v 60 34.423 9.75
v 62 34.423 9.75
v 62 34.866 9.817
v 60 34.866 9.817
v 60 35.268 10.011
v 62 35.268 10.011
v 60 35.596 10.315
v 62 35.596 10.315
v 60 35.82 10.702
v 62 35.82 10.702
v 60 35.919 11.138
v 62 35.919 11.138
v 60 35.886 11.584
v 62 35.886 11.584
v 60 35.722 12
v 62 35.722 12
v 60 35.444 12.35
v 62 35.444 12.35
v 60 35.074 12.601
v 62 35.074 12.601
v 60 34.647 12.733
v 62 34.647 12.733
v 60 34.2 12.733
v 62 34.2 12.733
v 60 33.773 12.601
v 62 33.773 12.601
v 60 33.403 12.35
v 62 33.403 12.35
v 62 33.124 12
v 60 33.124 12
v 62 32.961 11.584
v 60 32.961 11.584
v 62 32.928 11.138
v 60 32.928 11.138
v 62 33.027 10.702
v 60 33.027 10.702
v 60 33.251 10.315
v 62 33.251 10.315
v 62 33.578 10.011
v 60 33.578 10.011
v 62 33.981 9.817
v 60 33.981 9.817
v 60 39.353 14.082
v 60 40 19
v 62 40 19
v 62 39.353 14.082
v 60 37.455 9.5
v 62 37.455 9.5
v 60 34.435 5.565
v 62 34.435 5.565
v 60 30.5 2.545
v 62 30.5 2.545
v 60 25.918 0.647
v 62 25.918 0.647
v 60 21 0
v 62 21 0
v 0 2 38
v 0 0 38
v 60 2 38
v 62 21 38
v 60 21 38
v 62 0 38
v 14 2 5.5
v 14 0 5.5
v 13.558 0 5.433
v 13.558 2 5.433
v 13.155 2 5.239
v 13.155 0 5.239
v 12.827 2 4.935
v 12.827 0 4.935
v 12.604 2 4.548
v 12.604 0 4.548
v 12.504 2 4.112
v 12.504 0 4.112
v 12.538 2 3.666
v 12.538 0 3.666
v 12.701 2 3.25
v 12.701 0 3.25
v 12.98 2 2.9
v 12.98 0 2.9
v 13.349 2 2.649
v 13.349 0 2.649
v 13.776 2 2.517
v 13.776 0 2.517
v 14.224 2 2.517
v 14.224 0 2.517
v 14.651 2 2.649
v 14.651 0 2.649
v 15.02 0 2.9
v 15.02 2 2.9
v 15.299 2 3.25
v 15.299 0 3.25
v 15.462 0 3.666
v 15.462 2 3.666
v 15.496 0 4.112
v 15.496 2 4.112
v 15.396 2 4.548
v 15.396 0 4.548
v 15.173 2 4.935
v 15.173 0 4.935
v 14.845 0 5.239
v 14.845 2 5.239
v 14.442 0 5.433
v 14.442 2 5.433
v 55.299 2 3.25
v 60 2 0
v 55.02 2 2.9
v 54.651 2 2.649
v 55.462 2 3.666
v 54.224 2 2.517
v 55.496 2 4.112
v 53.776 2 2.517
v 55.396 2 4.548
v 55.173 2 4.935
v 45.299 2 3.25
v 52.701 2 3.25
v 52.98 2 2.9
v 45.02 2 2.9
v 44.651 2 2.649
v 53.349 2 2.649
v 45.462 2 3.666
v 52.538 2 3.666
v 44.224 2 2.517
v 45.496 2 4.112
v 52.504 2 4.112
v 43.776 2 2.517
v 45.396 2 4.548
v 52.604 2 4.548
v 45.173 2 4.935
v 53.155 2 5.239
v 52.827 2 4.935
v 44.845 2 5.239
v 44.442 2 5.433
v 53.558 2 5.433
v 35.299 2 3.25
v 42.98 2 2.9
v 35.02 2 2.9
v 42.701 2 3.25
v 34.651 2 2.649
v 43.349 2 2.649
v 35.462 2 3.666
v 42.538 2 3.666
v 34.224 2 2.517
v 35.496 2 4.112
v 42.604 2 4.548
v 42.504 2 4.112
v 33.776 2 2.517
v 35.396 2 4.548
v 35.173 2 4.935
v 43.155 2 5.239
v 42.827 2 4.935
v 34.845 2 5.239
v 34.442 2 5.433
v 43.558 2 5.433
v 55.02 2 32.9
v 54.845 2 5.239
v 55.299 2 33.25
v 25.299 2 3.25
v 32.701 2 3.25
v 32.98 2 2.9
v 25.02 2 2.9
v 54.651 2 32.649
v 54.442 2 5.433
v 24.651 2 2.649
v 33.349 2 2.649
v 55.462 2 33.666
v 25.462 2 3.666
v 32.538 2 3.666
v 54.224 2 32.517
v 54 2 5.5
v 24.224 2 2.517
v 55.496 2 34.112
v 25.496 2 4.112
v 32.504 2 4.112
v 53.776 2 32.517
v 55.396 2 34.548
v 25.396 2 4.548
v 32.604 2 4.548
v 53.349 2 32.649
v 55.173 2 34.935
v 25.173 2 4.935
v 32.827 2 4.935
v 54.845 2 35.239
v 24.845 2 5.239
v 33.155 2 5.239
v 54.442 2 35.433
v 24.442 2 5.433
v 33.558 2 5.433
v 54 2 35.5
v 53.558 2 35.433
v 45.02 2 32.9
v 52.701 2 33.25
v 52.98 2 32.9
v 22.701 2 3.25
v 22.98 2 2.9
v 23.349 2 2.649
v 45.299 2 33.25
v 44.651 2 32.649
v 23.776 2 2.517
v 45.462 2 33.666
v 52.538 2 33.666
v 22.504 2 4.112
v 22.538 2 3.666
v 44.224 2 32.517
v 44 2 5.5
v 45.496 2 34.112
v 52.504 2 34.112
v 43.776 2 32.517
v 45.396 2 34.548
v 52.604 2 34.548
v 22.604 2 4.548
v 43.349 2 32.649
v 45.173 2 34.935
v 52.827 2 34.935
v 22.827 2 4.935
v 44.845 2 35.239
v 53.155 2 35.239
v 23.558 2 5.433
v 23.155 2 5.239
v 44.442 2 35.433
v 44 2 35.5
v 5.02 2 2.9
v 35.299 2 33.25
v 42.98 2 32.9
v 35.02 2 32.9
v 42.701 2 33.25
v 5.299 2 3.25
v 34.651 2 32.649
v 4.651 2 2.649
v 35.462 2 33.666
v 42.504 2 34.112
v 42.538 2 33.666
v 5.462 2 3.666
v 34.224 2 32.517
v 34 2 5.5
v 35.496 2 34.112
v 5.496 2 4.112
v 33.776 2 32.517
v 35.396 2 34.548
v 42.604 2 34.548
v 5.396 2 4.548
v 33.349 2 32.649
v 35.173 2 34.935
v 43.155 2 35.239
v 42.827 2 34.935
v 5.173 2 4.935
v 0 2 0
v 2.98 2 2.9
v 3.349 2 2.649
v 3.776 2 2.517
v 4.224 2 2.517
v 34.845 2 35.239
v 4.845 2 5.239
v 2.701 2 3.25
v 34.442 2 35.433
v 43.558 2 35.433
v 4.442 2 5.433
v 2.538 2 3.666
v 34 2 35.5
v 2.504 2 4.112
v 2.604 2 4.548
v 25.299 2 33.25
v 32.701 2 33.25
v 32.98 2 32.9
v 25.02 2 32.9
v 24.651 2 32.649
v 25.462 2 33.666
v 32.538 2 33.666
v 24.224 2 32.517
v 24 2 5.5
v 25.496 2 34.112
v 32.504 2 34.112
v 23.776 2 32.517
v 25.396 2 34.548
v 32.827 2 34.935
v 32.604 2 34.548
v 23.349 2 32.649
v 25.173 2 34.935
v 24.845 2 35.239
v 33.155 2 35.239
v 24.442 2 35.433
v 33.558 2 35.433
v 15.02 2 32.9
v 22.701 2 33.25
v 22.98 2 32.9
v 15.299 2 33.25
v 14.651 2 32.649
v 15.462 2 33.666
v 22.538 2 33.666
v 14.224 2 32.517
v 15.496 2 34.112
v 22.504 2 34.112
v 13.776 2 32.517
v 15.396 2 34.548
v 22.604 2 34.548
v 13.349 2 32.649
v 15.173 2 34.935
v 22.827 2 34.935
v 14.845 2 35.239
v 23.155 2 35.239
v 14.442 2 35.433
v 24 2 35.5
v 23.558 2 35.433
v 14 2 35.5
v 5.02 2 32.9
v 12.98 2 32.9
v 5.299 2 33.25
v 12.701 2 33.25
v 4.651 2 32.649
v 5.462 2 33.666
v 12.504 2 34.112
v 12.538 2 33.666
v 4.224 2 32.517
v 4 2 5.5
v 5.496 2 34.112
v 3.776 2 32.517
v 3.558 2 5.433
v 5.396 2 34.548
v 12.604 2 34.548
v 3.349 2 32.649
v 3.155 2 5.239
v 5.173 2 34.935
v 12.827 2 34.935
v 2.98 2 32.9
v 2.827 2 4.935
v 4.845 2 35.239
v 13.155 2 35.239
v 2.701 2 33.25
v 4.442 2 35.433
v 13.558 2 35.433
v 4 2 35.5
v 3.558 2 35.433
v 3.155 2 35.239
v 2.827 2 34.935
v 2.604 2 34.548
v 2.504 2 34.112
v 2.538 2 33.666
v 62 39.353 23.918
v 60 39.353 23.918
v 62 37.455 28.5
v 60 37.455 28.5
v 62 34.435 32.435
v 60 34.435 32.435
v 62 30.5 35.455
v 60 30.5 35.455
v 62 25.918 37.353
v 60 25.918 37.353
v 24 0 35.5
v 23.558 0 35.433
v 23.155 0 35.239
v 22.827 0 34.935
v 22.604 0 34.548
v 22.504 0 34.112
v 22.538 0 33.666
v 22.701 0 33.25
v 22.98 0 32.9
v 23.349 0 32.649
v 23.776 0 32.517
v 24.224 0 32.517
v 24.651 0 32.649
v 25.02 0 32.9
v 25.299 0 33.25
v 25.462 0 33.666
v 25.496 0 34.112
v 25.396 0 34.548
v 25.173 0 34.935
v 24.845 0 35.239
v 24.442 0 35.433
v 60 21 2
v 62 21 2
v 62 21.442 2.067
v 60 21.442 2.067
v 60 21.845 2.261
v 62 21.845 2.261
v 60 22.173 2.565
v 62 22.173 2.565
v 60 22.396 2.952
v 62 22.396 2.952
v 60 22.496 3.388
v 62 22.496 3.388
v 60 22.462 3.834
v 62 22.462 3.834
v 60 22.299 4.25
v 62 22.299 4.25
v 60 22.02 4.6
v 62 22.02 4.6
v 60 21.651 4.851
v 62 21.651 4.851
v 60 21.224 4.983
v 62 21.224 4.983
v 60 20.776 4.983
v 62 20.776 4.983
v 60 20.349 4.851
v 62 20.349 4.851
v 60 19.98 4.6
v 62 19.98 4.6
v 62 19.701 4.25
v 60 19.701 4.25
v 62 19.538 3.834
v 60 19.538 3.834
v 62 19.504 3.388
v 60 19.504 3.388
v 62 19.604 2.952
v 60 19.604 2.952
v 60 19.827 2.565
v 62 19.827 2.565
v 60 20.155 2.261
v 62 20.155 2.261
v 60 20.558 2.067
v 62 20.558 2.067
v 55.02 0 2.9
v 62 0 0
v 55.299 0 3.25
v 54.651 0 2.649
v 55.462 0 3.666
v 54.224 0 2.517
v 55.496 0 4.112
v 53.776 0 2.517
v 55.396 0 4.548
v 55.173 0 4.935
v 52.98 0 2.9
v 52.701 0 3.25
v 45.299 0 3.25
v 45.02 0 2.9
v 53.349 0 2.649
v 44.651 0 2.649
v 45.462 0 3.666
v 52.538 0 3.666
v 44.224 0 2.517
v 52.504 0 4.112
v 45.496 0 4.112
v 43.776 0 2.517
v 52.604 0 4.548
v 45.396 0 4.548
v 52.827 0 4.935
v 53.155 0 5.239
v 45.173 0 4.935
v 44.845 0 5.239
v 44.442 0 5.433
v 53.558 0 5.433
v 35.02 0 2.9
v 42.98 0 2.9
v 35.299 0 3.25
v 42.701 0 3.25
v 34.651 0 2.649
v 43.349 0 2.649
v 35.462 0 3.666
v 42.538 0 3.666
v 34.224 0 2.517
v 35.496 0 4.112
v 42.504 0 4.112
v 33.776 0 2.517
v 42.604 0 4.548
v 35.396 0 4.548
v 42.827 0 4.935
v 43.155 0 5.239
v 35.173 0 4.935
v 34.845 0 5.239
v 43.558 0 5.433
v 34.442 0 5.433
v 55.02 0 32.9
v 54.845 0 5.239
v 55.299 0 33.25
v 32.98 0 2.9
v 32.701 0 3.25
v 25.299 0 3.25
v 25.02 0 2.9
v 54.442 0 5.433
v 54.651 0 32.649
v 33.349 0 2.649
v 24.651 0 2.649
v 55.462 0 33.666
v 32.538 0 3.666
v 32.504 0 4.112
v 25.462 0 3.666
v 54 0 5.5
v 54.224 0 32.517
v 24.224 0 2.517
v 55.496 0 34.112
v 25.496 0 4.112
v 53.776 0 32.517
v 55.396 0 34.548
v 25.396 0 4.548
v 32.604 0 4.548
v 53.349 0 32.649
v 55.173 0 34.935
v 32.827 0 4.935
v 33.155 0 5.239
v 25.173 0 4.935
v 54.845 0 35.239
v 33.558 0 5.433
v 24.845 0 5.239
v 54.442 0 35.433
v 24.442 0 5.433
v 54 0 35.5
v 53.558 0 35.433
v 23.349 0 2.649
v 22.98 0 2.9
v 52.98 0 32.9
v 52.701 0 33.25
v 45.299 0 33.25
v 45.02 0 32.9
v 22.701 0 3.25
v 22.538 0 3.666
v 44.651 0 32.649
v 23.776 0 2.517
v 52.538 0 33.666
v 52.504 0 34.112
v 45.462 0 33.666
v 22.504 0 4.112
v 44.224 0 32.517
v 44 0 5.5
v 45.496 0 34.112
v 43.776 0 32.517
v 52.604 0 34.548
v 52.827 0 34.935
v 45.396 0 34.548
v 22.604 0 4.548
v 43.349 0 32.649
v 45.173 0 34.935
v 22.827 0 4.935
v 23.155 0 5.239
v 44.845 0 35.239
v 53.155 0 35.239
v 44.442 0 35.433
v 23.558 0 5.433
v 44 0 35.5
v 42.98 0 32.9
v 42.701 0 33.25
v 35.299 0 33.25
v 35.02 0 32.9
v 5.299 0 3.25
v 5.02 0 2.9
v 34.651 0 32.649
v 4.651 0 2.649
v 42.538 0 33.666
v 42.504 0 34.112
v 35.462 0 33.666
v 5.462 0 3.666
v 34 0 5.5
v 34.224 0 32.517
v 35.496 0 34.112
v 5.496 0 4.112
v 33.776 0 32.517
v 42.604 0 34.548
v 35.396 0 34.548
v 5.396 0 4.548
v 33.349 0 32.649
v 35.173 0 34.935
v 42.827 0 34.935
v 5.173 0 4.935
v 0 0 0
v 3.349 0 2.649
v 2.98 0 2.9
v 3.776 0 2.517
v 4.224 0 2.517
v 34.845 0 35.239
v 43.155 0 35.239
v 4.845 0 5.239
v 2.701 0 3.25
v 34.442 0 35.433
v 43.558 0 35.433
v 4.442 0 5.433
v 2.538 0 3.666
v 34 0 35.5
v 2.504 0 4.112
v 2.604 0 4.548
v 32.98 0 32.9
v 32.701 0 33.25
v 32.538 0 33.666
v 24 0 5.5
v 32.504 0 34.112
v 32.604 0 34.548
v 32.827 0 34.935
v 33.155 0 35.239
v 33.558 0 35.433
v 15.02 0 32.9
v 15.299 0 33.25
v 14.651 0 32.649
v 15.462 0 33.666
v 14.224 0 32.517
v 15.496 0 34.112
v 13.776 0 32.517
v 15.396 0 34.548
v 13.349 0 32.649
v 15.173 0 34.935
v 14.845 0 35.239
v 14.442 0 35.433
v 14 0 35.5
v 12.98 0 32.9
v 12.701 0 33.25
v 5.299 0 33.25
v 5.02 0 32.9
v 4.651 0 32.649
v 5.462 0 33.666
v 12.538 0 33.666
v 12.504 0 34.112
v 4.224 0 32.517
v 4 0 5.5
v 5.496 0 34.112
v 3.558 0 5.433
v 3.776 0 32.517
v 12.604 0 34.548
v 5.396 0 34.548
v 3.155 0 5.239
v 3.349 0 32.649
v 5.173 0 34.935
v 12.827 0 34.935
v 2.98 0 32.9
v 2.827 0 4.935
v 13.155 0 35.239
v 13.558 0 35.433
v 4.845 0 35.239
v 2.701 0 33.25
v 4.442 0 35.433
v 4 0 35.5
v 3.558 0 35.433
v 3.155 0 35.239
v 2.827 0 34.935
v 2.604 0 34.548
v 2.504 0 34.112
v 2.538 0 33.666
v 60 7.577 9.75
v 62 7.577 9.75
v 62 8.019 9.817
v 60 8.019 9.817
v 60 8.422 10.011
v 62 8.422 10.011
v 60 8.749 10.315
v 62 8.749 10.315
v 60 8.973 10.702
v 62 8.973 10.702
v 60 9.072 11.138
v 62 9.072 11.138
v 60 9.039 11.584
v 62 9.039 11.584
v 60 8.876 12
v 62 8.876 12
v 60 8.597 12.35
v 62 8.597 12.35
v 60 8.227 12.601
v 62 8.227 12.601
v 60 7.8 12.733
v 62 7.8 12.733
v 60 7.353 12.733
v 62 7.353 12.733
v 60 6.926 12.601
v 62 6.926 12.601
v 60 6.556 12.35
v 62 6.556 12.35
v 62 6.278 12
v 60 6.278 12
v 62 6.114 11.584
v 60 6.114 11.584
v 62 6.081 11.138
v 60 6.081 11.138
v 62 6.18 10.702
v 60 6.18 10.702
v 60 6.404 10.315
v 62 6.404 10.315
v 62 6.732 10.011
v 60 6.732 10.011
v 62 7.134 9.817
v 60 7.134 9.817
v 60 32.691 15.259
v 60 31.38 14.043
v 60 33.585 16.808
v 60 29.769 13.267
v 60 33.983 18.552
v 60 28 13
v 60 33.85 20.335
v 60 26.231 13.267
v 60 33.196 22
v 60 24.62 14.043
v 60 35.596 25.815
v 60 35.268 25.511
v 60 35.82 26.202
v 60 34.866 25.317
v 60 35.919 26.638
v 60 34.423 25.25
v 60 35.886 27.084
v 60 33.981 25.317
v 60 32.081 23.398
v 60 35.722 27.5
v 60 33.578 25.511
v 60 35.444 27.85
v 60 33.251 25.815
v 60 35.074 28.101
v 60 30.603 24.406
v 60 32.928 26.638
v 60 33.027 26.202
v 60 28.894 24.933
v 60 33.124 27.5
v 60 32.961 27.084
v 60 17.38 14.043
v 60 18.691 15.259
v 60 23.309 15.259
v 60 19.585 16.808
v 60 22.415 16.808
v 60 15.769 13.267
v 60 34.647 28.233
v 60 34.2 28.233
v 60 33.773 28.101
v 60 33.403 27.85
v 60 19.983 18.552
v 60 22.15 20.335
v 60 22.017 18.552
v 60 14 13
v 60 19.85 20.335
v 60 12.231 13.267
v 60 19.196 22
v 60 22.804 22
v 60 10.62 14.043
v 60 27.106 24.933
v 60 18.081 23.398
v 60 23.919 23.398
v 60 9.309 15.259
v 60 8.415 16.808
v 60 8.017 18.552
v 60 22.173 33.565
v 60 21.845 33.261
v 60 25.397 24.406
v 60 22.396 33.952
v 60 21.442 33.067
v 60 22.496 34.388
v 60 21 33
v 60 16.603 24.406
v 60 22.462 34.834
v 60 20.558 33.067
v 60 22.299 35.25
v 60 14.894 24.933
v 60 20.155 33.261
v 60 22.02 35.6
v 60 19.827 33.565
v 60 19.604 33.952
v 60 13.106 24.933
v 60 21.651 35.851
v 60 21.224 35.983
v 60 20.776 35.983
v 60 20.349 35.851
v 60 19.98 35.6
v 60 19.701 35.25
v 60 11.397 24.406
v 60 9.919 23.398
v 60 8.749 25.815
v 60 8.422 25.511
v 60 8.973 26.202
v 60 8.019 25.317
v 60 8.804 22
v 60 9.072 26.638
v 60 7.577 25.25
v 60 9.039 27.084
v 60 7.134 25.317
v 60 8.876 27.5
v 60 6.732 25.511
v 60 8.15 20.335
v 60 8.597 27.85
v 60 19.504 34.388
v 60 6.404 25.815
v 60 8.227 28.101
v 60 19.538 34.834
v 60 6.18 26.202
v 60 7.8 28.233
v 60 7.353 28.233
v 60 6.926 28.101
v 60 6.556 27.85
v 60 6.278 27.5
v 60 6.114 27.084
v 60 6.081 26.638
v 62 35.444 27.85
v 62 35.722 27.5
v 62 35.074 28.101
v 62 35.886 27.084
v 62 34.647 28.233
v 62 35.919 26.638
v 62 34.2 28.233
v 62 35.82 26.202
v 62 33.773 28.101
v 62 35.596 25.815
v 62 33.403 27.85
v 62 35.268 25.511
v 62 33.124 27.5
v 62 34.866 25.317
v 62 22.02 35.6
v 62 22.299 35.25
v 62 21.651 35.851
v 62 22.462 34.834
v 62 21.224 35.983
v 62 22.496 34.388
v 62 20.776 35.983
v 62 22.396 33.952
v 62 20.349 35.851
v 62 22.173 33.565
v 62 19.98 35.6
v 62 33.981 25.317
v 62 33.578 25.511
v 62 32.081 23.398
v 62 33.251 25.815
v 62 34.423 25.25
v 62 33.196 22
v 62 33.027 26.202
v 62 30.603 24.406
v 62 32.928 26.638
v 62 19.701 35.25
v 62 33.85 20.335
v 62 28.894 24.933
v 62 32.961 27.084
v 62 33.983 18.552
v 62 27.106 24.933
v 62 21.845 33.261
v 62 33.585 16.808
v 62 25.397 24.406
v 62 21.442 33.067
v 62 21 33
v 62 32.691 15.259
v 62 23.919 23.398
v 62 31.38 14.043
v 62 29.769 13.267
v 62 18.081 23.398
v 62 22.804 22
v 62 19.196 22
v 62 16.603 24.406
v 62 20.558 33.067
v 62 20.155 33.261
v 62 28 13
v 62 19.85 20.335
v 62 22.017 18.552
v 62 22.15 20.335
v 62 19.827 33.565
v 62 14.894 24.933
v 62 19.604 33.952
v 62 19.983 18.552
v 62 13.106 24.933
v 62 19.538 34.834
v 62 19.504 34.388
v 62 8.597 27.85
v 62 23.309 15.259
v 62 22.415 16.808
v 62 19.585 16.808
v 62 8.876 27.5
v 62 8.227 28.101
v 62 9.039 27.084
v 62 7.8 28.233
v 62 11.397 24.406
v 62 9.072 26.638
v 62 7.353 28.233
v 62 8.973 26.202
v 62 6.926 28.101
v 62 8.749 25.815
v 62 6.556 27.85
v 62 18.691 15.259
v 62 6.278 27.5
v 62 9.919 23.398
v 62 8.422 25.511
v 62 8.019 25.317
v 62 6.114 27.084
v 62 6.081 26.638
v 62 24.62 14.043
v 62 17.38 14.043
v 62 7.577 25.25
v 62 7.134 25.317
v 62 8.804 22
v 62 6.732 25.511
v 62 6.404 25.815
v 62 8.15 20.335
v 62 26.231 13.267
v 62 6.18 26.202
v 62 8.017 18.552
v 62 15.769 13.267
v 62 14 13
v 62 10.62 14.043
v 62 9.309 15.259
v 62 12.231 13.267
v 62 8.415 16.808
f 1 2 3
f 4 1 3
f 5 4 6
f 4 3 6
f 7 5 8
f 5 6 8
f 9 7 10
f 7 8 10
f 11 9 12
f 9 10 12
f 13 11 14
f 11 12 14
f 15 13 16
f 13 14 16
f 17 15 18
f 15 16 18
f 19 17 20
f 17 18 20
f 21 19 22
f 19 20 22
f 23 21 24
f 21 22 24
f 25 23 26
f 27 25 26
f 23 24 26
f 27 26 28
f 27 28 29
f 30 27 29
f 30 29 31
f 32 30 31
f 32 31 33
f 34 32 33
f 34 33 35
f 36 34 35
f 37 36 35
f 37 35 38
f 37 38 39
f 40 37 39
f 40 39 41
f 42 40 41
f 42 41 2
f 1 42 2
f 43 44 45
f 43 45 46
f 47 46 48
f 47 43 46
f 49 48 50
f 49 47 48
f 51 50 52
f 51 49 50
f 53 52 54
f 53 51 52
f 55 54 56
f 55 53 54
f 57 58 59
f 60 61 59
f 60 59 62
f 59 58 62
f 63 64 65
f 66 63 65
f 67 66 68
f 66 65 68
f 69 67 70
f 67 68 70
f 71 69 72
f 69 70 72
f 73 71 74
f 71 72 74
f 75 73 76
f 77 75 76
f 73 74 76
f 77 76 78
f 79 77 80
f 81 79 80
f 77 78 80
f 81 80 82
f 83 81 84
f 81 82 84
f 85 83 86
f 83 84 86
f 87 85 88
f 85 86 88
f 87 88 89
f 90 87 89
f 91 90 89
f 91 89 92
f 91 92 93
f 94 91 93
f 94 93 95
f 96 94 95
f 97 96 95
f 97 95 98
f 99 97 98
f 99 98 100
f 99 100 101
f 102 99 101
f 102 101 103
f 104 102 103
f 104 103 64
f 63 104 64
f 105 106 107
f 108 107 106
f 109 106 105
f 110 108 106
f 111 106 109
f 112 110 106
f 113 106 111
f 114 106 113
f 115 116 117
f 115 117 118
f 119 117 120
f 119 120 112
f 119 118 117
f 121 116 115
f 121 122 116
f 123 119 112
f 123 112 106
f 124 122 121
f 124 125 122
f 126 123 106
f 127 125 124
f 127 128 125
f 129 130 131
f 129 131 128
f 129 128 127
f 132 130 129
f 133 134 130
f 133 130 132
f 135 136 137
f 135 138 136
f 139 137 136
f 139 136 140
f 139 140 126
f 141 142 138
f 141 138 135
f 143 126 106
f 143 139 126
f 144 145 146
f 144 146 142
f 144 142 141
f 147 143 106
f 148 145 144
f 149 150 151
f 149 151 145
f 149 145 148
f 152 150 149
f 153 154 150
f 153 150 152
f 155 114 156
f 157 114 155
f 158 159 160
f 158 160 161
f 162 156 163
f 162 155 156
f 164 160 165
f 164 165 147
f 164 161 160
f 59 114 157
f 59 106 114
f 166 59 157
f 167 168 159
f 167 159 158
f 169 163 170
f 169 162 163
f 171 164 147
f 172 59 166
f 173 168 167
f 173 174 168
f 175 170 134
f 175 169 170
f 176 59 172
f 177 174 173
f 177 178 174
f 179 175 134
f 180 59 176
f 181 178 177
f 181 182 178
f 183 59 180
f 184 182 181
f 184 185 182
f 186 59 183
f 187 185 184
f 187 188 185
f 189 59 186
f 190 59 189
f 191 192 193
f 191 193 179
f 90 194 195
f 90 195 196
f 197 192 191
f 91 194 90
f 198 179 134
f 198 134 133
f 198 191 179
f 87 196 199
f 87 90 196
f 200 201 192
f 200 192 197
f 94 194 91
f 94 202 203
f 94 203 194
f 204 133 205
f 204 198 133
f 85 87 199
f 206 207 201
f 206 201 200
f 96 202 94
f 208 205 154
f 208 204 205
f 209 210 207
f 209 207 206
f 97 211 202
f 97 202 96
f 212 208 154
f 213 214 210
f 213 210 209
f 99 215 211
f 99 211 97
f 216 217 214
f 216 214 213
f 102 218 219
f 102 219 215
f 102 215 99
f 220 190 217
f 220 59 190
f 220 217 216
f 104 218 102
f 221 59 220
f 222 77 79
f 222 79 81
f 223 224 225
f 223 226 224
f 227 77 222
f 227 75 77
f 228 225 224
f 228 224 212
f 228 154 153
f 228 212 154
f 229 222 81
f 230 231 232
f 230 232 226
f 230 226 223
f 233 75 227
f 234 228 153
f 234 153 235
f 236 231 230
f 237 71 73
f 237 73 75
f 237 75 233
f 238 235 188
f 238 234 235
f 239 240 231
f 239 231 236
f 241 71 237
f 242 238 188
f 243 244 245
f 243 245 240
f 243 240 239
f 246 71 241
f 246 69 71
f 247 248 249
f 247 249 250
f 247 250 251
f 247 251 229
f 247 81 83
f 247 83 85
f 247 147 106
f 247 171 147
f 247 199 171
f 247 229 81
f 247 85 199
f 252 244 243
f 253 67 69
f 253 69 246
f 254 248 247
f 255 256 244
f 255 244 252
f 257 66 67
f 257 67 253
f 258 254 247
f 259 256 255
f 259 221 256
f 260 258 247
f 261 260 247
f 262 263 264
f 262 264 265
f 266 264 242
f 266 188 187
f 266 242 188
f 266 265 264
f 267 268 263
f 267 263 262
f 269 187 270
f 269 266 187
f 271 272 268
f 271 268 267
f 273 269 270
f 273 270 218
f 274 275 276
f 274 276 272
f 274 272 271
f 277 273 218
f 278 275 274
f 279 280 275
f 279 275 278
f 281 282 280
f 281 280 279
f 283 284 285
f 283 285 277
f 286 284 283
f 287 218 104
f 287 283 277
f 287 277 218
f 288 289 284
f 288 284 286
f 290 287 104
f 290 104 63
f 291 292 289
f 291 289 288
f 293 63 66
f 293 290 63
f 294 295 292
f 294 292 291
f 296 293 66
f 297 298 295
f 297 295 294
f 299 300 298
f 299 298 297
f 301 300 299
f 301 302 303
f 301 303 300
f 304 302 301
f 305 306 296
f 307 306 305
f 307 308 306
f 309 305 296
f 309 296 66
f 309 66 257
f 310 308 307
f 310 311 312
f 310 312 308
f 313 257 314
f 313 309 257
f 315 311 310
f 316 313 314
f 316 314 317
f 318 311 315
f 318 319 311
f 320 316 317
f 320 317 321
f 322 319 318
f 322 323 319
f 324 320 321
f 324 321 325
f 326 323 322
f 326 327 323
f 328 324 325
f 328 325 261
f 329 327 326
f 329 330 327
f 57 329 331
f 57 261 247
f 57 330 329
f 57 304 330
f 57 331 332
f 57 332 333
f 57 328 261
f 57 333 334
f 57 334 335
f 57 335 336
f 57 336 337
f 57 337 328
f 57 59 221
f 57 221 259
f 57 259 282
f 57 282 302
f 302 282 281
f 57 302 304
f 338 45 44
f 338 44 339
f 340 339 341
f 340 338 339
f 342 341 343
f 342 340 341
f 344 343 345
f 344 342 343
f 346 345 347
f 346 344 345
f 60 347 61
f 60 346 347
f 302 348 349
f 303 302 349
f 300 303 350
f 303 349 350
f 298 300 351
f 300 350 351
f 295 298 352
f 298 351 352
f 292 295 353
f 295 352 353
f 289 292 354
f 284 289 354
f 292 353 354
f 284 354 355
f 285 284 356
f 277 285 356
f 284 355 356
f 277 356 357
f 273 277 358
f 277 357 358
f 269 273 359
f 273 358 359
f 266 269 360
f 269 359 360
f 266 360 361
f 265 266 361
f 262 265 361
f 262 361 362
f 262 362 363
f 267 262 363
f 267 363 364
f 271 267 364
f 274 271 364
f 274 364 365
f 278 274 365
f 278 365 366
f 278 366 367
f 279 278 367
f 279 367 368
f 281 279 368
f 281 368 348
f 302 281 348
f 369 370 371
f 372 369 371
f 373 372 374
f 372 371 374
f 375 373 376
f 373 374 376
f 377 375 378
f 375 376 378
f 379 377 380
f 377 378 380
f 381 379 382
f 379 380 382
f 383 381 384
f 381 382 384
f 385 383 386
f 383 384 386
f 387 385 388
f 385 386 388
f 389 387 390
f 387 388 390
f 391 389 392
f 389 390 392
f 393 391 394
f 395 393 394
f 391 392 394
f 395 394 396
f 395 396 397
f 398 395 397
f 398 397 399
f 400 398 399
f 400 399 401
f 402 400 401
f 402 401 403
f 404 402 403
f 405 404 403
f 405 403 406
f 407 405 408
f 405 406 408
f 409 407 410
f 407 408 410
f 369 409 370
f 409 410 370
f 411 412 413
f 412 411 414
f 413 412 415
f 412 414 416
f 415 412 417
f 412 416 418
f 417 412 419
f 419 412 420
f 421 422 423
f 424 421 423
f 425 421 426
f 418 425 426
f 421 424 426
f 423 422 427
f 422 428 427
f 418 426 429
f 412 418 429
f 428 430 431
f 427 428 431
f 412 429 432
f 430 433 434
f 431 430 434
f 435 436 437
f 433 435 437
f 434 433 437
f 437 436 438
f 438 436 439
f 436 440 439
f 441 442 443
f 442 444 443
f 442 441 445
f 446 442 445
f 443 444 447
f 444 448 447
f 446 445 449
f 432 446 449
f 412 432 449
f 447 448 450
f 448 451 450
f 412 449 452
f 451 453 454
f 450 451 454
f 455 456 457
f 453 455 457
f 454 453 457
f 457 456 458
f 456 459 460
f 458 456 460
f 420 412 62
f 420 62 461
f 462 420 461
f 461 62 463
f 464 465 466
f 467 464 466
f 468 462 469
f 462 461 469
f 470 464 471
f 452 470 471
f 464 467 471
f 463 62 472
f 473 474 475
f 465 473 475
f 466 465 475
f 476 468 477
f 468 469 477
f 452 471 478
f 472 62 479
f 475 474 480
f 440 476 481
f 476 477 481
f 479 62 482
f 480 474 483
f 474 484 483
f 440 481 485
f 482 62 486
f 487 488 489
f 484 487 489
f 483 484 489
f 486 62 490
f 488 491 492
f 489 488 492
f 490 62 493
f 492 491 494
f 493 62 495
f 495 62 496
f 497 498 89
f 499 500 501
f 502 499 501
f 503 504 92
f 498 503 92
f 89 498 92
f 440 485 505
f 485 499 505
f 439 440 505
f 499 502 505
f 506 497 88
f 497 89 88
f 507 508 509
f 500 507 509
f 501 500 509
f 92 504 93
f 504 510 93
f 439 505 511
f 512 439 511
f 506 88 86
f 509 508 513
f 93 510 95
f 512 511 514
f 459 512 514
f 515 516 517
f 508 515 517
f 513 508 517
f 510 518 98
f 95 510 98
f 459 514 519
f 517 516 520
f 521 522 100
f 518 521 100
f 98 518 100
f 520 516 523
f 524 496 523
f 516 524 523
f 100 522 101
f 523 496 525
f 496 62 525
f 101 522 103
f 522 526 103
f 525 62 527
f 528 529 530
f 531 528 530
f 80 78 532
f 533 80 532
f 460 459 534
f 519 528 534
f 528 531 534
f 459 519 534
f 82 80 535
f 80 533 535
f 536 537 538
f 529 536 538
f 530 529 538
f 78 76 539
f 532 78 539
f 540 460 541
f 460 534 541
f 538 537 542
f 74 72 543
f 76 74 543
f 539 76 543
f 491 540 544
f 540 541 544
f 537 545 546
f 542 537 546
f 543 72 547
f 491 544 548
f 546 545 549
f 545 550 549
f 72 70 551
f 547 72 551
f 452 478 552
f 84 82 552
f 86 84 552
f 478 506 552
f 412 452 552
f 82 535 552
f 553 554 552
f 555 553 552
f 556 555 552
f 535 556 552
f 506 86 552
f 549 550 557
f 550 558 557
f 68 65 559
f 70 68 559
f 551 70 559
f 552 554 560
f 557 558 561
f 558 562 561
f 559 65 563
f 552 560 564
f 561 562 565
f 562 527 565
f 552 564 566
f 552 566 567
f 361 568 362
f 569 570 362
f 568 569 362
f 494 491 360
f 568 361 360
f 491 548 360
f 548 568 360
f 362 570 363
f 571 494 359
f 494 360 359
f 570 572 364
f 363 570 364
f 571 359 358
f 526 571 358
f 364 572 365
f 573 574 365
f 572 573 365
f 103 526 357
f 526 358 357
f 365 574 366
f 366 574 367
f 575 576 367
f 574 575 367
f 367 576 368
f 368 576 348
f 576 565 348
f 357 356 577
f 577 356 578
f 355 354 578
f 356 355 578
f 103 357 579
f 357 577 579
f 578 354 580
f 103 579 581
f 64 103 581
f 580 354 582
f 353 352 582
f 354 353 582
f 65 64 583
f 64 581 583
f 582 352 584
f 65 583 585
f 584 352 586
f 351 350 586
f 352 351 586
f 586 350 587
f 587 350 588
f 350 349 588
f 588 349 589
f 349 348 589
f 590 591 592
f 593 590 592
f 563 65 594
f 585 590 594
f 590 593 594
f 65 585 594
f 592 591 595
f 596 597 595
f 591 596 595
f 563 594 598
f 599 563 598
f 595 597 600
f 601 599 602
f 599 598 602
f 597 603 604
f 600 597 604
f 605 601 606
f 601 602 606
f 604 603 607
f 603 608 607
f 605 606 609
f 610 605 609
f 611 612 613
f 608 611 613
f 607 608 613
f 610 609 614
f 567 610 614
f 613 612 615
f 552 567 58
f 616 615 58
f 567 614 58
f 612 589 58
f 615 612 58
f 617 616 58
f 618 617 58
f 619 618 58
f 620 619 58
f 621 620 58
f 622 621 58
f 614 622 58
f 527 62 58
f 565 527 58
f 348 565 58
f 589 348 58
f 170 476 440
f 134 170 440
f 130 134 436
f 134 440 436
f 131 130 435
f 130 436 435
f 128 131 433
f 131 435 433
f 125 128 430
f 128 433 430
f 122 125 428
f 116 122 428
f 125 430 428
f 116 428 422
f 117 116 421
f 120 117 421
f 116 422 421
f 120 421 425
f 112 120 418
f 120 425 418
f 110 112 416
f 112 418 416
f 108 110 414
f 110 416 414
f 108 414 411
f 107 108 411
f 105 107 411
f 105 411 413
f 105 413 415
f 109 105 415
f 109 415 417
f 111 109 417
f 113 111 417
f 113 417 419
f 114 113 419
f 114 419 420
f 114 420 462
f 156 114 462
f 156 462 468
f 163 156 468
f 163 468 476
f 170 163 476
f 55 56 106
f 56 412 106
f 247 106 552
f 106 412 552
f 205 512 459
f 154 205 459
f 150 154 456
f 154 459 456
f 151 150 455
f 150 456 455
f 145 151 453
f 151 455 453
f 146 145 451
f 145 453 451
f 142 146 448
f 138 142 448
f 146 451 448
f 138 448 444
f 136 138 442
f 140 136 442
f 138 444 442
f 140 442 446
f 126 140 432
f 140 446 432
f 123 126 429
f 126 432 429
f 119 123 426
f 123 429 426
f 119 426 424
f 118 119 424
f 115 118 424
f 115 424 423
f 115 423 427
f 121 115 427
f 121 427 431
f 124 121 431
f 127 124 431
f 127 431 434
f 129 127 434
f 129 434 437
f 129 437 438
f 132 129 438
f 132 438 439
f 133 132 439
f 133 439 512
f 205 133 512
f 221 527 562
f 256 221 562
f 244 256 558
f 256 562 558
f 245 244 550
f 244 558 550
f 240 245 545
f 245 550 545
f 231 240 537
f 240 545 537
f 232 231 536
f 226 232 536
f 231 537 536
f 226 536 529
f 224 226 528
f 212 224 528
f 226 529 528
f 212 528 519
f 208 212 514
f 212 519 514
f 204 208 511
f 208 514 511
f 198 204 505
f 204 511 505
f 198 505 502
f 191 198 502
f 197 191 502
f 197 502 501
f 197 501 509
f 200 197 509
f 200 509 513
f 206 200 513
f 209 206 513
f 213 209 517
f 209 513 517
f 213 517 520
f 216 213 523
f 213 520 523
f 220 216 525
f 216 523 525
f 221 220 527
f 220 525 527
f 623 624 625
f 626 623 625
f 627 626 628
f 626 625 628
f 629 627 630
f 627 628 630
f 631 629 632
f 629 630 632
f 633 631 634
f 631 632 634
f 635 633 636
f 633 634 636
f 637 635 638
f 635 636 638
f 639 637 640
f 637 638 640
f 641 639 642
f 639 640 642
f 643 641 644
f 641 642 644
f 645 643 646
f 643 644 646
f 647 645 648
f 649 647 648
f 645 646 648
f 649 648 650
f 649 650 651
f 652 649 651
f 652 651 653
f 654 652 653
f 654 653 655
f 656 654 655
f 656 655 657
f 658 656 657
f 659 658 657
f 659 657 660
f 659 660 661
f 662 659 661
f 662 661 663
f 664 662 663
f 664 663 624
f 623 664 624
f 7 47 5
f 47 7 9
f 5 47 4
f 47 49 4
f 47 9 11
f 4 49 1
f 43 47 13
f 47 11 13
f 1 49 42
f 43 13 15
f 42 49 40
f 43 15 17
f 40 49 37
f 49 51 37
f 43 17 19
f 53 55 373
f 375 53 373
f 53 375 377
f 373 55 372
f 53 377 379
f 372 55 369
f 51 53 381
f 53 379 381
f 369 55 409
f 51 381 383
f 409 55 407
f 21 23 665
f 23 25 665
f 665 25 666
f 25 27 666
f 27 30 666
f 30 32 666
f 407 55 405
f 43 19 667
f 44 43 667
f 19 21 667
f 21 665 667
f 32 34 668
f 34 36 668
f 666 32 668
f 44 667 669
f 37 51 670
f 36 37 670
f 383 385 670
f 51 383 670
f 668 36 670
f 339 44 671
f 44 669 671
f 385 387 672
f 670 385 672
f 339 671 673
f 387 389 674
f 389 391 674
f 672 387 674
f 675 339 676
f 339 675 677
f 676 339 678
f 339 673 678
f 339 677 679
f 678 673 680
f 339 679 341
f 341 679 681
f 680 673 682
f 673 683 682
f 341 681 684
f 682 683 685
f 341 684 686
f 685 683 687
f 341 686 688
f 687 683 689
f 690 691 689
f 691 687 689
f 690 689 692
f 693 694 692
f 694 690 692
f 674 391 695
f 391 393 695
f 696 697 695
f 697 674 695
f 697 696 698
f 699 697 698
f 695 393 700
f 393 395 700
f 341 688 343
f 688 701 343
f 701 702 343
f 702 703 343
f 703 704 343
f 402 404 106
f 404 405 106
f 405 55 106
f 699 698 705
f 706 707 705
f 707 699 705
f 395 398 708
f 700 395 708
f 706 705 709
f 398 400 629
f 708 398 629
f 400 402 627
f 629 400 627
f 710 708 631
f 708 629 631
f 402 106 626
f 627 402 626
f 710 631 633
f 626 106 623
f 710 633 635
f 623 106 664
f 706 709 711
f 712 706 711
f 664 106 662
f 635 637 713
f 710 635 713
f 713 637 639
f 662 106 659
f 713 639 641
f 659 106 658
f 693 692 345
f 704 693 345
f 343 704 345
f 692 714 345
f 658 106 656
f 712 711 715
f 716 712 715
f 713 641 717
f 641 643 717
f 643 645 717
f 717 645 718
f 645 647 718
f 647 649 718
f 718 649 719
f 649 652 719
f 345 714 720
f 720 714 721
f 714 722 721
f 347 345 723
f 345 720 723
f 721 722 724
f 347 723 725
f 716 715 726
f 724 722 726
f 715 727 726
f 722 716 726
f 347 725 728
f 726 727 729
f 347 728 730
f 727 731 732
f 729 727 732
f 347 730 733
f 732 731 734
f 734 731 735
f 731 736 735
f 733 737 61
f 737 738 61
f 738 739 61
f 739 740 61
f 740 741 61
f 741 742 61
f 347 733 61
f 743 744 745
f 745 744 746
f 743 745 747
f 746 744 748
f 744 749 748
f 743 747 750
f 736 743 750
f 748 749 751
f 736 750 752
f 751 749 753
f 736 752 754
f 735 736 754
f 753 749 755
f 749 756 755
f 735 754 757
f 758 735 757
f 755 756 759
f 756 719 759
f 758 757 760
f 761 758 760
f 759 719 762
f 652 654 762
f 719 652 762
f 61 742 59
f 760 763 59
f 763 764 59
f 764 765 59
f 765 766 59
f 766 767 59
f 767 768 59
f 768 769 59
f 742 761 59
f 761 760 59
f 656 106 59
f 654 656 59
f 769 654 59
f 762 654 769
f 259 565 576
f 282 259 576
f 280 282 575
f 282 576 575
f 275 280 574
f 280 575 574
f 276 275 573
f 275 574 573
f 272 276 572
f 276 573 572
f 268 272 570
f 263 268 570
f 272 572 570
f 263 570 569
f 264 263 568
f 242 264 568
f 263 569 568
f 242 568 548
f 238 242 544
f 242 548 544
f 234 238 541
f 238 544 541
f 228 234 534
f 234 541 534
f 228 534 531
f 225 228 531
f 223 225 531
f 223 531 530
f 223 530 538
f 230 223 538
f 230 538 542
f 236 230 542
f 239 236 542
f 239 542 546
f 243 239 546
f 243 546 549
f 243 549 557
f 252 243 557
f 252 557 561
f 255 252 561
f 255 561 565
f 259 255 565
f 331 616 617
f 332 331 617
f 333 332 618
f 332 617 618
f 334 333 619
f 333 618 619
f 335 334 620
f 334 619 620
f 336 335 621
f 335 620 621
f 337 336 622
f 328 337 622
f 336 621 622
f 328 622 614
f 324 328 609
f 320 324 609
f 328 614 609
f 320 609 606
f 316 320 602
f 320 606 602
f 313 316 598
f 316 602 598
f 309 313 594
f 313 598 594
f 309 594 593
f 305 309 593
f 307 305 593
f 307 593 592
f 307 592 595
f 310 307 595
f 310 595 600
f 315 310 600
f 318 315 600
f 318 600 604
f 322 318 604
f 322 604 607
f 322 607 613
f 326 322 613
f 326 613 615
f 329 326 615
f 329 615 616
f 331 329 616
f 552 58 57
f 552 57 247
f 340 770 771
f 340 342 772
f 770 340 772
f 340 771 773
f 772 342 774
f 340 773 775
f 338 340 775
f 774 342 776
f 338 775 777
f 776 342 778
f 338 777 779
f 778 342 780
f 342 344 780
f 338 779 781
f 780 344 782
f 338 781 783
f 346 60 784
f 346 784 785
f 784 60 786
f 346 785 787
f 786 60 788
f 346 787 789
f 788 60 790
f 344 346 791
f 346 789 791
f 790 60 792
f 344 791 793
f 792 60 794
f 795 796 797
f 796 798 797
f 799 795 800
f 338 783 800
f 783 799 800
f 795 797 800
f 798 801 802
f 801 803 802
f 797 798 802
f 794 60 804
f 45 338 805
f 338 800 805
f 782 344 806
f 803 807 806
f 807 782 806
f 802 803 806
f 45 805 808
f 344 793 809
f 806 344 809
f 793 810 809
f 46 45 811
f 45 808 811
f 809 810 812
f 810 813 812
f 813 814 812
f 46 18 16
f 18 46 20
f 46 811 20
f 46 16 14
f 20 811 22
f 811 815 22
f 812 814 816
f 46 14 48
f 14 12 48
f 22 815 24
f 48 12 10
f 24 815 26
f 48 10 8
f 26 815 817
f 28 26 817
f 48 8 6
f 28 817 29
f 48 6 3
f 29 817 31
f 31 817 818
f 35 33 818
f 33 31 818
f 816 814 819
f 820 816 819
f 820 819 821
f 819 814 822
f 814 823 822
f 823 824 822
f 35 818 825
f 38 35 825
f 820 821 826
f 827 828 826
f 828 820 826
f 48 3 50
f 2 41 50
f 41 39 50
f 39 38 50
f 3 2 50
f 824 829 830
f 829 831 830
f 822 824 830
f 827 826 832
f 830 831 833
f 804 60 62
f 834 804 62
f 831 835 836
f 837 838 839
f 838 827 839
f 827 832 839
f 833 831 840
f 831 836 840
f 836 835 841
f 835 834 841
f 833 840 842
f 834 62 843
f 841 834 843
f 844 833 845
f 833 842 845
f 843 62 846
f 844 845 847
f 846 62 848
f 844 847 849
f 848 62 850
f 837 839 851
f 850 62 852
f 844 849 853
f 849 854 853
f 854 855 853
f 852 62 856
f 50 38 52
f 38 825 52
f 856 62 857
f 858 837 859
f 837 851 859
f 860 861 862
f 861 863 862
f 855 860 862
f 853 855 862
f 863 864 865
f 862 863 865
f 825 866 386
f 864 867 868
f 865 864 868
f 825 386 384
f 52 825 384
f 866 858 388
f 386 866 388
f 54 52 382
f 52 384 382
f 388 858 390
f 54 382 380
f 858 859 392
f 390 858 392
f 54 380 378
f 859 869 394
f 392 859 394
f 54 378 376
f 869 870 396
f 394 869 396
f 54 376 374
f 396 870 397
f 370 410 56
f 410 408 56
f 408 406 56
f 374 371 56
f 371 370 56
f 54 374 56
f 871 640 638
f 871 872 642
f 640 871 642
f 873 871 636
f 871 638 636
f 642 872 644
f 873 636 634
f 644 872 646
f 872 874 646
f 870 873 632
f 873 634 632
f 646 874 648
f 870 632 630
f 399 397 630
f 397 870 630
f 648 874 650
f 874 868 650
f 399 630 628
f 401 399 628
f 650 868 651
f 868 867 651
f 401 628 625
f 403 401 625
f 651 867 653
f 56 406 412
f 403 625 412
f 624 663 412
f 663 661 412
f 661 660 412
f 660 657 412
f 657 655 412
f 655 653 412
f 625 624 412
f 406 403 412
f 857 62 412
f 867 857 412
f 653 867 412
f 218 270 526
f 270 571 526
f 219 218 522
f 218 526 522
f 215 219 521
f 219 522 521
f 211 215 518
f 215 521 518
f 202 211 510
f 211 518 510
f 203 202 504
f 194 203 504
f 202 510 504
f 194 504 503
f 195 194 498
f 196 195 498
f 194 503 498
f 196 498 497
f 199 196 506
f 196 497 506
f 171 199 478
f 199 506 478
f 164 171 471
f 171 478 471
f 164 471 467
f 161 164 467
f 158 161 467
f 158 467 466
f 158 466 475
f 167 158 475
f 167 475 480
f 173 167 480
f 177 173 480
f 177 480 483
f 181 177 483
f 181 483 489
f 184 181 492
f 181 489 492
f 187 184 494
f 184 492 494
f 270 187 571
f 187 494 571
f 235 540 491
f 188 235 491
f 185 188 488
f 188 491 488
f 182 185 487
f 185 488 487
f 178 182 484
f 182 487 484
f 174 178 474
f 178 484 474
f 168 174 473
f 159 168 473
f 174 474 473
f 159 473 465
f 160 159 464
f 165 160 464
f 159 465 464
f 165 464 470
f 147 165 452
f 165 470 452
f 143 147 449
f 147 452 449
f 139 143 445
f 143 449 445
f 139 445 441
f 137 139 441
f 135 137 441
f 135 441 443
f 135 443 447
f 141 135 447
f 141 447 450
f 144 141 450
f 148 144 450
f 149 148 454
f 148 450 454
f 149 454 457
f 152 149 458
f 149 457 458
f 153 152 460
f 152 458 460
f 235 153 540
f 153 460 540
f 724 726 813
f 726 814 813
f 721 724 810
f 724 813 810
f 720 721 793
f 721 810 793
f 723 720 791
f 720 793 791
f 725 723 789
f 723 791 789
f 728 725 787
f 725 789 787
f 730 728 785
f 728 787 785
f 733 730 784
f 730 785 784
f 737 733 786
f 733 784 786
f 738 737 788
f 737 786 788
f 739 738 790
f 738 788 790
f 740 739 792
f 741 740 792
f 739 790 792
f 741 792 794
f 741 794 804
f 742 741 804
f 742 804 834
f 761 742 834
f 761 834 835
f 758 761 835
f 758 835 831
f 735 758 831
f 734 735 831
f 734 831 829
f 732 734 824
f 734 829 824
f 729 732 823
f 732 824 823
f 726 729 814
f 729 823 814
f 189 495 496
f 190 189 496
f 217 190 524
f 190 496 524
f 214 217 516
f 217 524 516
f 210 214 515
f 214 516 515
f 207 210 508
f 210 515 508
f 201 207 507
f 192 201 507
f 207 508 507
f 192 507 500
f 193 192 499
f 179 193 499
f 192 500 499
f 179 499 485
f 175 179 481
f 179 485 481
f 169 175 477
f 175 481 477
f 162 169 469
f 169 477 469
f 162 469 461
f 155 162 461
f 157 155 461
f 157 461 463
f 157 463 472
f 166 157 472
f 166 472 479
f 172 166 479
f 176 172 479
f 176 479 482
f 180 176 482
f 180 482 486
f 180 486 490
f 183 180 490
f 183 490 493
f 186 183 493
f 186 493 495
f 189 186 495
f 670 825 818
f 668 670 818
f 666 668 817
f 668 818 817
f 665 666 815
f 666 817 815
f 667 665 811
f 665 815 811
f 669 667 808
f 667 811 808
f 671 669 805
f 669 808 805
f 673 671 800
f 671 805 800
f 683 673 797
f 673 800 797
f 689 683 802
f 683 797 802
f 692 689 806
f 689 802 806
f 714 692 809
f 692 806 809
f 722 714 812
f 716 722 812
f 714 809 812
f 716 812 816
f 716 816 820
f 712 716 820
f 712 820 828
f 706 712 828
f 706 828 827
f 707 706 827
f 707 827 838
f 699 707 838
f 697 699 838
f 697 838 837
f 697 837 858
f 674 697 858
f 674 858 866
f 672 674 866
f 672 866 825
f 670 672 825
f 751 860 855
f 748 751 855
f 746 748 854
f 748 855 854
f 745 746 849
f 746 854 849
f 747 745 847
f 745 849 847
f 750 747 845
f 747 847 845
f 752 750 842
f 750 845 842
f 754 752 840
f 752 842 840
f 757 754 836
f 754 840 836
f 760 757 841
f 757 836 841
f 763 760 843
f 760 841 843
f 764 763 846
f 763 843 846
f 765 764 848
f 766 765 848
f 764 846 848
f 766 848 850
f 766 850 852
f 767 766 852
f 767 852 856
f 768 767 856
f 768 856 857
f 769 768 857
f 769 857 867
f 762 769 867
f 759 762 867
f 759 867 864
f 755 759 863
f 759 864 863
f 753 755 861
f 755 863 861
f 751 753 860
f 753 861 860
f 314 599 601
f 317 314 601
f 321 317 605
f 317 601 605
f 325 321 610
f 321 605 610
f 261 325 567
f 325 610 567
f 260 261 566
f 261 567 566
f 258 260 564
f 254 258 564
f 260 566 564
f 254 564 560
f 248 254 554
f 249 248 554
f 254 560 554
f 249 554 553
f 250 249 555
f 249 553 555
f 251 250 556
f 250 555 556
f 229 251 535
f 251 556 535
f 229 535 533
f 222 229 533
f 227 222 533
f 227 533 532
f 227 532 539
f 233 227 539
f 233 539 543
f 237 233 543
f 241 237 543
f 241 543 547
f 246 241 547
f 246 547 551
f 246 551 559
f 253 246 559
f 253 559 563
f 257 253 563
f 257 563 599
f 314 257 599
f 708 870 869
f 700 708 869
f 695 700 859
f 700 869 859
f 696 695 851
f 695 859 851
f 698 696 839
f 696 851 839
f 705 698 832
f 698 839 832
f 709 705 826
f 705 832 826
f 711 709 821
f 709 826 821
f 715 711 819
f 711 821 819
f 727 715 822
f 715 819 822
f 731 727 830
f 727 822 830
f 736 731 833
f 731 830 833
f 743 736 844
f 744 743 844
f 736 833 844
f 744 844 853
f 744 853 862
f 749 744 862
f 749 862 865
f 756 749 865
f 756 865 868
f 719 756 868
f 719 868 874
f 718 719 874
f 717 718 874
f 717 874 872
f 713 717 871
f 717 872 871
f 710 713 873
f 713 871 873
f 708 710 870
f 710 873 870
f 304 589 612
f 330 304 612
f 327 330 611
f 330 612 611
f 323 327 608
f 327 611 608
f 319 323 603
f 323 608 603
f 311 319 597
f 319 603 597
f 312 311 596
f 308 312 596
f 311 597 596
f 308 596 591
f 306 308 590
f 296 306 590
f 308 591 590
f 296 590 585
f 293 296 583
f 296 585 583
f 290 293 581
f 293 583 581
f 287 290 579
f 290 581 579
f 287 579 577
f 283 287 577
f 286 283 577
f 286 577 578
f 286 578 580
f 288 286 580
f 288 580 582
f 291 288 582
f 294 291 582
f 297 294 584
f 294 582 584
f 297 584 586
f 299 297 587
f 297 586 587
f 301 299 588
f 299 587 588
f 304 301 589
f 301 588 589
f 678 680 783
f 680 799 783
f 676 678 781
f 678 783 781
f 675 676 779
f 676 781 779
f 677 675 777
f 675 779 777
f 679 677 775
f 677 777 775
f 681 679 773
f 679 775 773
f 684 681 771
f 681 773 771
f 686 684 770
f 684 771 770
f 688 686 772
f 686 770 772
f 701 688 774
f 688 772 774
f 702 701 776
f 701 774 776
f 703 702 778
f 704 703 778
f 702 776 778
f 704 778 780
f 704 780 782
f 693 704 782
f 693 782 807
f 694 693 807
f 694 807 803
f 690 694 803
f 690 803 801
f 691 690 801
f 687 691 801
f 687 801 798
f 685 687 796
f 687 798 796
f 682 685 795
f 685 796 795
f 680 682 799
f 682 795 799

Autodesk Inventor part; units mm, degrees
ref_plane "YZ Plane" through (0, 0, 0) normal (1, 0, 0) x (0, 1, 0)
ref_plane "XZ Plane" through (0, 0, 0) normal (0, 1, 0) x (-1, 0, 0)
ref_plane "XY Plane" through (0, 0, 0) normal (0, 0, 1) x (1, 0, 0)
sketch "スケッチ1" plane through (0, 0, 0) normal (0, 1, 0) x (-1, 0, 0)
  line L0 (0, 0) -> (-62, 0)
  line L1 (-62, 0) -> (-62, 38)
  line L2 (-62, 38) -> (0, 38)
  line L3 (0, 38) -> (0, 0)
  dimension "d0" = 62
  dimension "d1" = 38
extrude "押し出し1" add sketch "スケッチ1" along normal blind 2
sketch "スケッチ2" plane through (0, 2, 0) normal (0, 1, 0) x (1, 0, 0)
  line L0 (0, 0) -> (0, -38) projected
  line L1 (62, -38) -> (62, 0) projected
  line L2 (0, 0) -> (4, 0)
  line L3 (4, 0) -> (4, -4)
  line L4 (4, -4) -> (0, -4)
  line L5 (0, -4) -> (0, 0)
  line L6 (4, -4) -> (14, -4)
  line L7 (14, -4) -> (24, -4)
  line L8 (24, -4) -> (34, -4)
  line L9 (34, -4) -> (44, -4)
  line L10 (44, -4) -> (54, -4)
  line L11 (0, -19) -> (62, -19)
  point P0 (4, -34)
  point P1 (14, -34)
  point P2 (24, -34)
  point P3 (34, -34)
  point P4 (44, -34)
  point P5 (54, -34)
  point P6 (4, -34)
  point P7 (14, -34)
  dimension "d4" = 4
  dimension "d5" = 4
  dimension "d6" = 10
  dimension "d7" = 10
  dimension "d8" = 10
  dimension "d9" = 10
  dimension "d10" = 10
hole "穴1" at (4, 2, 4) at (14, 2, 4) at (24, 2, 4) at (34, 2, 4) at (44, 2, 4) at (54, 2, 4) at (24, 2, 34) at (34, 2, 34) at (44, 2, 34) at (54, 2, 34) at (4, 2, 34) at (14, 2, 34) direction (0, -1, 0) diameter 3 depth 8 tip angle 118
sketch "スケッチ3" plane through (0, 2, 0) normal (0, 1, 0) x (1, 0, 0)
  line L0 (0, -38) -> (62, -38) projected
  line L1 (62, -38) -> (62, 0) projected
  line L2 (62, 0) -> (60, 0)
  line L3 (60, 0) -> (60, -38)
  line L4 (60, -38) -> (62, -38)
  line L5 (62, -38) -> (62, 0)
  dimension "d18" = 2
extrude "押し出し2" add sketch "スケッチ3" along normal blind 38
fillet "フィレット1" radius 19 2 edges at (61, 40, 38) (61, 40, 0)
sketch "スケッチ4" plane through (62, 0, 38) normal (1, 0, 0) x (0, 0, -1)
  arc A0 (38, 21) -> (0, 21) centre (19, 21) ccw projected
  line L0 (38, 0) -> (38, 21) projected
  circle A1 centre (19, 21) radius 15.5
  circle A2 centre (34.5, 21) radius 1.5
  circle A3 centre (26.75, 34.4234) radius 1.5
  circle A4 centre (11.25, 34.4234) radius 1.5
  circle A5 centre (3.5, 21) radius 1.5
  circle A6 centre (11.25, 7.5766) radius 1.5
  circle A7 centre (26.75, 7.5766) radius 1.5
  line L1 (19, 21) -> (19, 28)
  circle A8 centre (19, 28) radius 6
  line L2 (19, 21) -> (19, 14)
  circle A9 centre (19, 14) radius 6
  dimension "d22" = 31
  dimension "d23" = 3
  dimension "d26" = 360
  dimension "d28" = 7
  dimension "d29" = 12
  dimension "d30" = 7
  dimension "d31" = 12
extrude "押し出し3" cut sketch "スケッチ4" against normal blind 3 contours A1 A2 | A1 A2 | A3 A1 | A1 A3 | A7 A1 | A1 A7 | A4 A1 | A1 A4 | A6 A1 | A1 A6 | A5 A1 | A1 A5 | A8 | A9
properties part number "知能ロボコンタミヤギヤードモータ用マウント"
